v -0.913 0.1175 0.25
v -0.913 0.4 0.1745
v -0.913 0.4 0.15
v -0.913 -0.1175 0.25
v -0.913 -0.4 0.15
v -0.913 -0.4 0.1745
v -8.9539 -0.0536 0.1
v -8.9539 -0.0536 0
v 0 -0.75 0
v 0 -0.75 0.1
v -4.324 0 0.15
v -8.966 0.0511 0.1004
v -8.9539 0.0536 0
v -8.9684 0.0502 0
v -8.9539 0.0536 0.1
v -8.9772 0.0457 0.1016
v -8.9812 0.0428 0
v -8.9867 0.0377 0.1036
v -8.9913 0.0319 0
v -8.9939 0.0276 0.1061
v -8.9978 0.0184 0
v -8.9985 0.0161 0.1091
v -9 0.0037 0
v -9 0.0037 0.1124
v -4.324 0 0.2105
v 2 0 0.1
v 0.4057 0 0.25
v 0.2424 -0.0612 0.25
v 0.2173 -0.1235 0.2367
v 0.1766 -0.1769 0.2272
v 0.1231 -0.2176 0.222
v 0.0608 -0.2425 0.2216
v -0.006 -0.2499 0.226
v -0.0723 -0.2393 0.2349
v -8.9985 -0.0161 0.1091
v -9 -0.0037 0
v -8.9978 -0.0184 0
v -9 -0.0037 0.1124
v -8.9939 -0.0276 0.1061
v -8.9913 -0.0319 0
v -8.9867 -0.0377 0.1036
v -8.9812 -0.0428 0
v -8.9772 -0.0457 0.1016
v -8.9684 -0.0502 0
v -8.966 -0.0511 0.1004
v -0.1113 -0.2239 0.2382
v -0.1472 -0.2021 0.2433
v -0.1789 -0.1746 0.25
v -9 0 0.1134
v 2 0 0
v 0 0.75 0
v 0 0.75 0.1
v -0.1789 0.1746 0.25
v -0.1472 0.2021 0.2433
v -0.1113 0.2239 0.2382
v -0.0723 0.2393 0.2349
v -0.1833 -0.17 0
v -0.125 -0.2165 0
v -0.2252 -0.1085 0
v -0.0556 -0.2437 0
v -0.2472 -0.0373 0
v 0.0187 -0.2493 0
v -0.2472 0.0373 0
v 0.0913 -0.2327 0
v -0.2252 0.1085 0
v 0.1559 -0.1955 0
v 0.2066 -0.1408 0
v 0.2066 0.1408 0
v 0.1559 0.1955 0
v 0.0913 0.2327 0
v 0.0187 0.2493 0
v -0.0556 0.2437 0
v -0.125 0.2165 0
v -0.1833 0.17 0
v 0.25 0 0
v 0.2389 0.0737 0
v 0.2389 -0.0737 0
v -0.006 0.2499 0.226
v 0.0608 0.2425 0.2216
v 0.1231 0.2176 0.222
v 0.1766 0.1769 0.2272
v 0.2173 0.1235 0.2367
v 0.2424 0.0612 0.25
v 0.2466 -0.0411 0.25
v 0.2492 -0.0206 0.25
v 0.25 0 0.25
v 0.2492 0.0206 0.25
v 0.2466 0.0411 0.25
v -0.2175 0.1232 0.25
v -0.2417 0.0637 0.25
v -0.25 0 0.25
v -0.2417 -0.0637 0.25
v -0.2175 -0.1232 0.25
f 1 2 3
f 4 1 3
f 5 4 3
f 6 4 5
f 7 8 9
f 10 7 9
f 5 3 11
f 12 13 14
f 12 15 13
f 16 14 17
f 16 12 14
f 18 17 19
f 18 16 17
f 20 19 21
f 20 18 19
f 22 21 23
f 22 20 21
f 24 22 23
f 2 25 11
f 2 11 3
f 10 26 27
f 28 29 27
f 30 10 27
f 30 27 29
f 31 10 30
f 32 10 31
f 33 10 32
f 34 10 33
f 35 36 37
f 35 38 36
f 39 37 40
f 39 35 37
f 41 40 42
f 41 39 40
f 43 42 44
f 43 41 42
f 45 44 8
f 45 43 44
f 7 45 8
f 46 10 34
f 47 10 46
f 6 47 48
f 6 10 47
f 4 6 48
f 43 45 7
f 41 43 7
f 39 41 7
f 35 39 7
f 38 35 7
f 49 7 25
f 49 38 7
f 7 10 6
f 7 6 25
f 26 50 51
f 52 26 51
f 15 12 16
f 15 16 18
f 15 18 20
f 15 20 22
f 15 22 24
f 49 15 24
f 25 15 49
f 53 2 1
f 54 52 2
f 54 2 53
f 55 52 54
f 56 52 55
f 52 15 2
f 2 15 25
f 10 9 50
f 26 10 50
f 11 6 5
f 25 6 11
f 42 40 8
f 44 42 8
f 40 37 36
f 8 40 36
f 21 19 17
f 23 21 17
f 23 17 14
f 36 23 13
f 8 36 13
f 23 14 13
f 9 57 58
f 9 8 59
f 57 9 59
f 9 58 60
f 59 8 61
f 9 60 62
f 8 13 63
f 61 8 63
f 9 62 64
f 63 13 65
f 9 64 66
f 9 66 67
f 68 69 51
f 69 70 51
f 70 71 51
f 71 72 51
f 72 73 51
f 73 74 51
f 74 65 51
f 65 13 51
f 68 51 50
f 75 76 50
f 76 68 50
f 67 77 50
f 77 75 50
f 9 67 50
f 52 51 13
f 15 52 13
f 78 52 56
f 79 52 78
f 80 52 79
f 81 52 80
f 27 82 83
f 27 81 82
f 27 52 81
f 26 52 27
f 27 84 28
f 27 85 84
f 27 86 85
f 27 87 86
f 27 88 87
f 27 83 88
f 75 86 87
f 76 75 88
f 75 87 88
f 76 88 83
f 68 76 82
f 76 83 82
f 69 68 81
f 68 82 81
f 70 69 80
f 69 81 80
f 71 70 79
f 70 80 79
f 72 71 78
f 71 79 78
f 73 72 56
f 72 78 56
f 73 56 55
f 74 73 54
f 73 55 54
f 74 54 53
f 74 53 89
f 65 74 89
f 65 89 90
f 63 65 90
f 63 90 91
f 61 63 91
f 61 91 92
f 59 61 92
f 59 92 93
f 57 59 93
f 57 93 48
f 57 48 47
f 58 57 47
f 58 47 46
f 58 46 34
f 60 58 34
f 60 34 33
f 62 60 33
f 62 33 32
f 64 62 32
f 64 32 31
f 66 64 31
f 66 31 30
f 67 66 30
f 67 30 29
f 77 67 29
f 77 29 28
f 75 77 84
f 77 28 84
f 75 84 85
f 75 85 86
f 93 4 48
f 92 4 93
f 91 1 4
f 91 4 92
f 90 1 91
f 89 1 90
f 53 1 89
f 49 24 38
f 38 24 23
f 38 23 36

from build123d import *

# Parameters (mm, degrees)
BOSS_EXTRUDE1_DEPTH = 0.25
SKETCH2_R           = 0.25
CUT_EXTRUDE1_DEPTH  = 0.25
CHAMFER1_SIZE       = 0.15
CHAMFER1_SIZE_2     = 0.559807621
FILLET1_R           = 0.05
CUT_EXTRUDE2_DEPTH  = 0.1


with BuildPart() as part:
    # Sketch1 → Boss-Extrude1 (new body)
    with BuildSketch(Plane.XY):
        Polygon((0, 0.75), (-9, 0.05), (-9, -0.05), (0, -0.75), (2, 0), align=None)
    extrude(amount=BOSS_EXTRUDE1_DEPTH)

    # Sketch2 → Cut-Extrude1 (cut)
    with BuildSketch(Plane.XY.offset(0.25)):
        Circle(SKETCH2_R)
    extrude(amount=-CUT_EXTRUDE1_DEPTH, mode=Mode.SUBTRACT)

    # Chamfer1
    # the kernel refuses this chamfer: 0.559807621, 0.15 mm, written as the material it takes off along each edge
    with BuildSketch(Plane(origin=(3.361108509, -0.510415691, 0.25), x_dir=(0.04828384365935674, 0.12875691642495132, -0.9905000388259542), z_dir=(-0.9363291775690445, 0.3511234415883917, 0))) as chamfer1_piece_1:
        Polygon((CHAMFER1_SIZE * 0.990500038826, CHAMFER1_SIZE * 0.137512447021), (-CHAMFER1_SIZE_2 * 0.137512447055, CHAMFER1_SIZE_2 * 0.990500039065), (0, 0), align=None)
    extrude(amount=5.043329986, mode=Mode.SUBTRACT)
    with BuildSketch(Plane(origin=(1.449287487, 0.86272236, 0.25), x_dir=(-0.010663208262792517, 0.13709839195018952, -0.990500038825954), z_dir=(-0.9969889629624744, -0.07754358600819244, 0))) as chamfer1_piece_2:
        Polygon((CHAMFER1_SIZE * 0.990500038826, CHAMFER1_SIZE * 0.137512447021), (-CHAMFER1_SIZE_2 * 0.137512447055, CHAMFER1_SIZE_2 * 0.990500039065), (0, 0), align=None)
    extrude(amount=11.934510227, mode=Mode.SUBTRACT)

    # Chamfer2
    # the kernel refuses this chamfer: 0.559807621, 0.15 mm, written as the material it takes off along each edge
    with BuildSketch(Plane(origin=(-3.266660422, -1.974997658, 0.25), x_dir=(0.04828384365935697, -0.12875691642495193, -0.9905000388259542), z_dir=(0.9363291775690445, 0.3511234415883917, 0))) as chamfer2_piece_1:
        with BuildLine():
            Line((0.157289802, 0), (-0.085695312, 0.575116338))
            Line((-0.085695312, 0.575116338), (-0.096785101, 0.573576727))
            ThreePointArc((-0.096785101, 0.573576727), (-0.051067197, 0.286417039), (-0.011089789, -0.00153961))
            Line((-0.011089789, -0.00153961), (0.00153961, -0.011089789))
            ThreePointArc((0.00153961, -0.011089789), (0.078697362, -0.000377875), (0.158829412, -0.011089789))
            Line((0.158829412, -0.011089789), (0.157289802, 0))
        make_face()
    extrude(amount=8.262216566, mode=Mode.SUBTRACT)
    with BuildSketch(Plane(origin=(-9.511515098, -0.010215492, 0.25), x_dir=(-0.010663208262792486, -0.13709839195018902, -0.9905000388259542), z_dir=(0.9969889629624744, -0.0775435860081925, 0))) as chamfer2_piece_2:
        with BuildLine():
            Line((0.157289802, 0), (-0.085695312, 0.575116338))
            Line((-0.085695312, 0.575116338), (-0.096785101, 0.573576727))
            ThreePointArc((-0.096785101, 0.573576727), (-0.051067197, 0.286417039), (-0.011089789, -0.00153961))
            Line((-0.011089789, -0.00153961), (0.00153961, -0.011089789))
            ThreePointArc((0.00153961, -0.011089789), (0.078697362, -0.000377875), (0.158829412, -0.011089789))
            Line((0.158829412, -0.011089789), (0.157289802, 0))
        make_face()
    extrude(amount=13.029035977, mode=Mode.SUBTRACT)

    # Fillet1
    fillet1_edges = [part.edges().sort_by_distance(p)[0] for p in [
        (-9, 0.05, 0.05),
        (-9, -0.05, 0.05),
    ]]
    fillet(fillet1_edges, radius=FILLET1_R)

    # Sketch3 → Cut-Extrude2 (cut)
    with BuildSketch(Plane.XY.offset(0.25)):
        Polygon((-0.912980909, 0.4), (-0.912980909, -0.4), (-4.323983168, 0), align=None)
    extrude(amount=-CUT_EXTRUDE2_DEPTH, mode=Mode.SUBTRACT)


solid = part.part
